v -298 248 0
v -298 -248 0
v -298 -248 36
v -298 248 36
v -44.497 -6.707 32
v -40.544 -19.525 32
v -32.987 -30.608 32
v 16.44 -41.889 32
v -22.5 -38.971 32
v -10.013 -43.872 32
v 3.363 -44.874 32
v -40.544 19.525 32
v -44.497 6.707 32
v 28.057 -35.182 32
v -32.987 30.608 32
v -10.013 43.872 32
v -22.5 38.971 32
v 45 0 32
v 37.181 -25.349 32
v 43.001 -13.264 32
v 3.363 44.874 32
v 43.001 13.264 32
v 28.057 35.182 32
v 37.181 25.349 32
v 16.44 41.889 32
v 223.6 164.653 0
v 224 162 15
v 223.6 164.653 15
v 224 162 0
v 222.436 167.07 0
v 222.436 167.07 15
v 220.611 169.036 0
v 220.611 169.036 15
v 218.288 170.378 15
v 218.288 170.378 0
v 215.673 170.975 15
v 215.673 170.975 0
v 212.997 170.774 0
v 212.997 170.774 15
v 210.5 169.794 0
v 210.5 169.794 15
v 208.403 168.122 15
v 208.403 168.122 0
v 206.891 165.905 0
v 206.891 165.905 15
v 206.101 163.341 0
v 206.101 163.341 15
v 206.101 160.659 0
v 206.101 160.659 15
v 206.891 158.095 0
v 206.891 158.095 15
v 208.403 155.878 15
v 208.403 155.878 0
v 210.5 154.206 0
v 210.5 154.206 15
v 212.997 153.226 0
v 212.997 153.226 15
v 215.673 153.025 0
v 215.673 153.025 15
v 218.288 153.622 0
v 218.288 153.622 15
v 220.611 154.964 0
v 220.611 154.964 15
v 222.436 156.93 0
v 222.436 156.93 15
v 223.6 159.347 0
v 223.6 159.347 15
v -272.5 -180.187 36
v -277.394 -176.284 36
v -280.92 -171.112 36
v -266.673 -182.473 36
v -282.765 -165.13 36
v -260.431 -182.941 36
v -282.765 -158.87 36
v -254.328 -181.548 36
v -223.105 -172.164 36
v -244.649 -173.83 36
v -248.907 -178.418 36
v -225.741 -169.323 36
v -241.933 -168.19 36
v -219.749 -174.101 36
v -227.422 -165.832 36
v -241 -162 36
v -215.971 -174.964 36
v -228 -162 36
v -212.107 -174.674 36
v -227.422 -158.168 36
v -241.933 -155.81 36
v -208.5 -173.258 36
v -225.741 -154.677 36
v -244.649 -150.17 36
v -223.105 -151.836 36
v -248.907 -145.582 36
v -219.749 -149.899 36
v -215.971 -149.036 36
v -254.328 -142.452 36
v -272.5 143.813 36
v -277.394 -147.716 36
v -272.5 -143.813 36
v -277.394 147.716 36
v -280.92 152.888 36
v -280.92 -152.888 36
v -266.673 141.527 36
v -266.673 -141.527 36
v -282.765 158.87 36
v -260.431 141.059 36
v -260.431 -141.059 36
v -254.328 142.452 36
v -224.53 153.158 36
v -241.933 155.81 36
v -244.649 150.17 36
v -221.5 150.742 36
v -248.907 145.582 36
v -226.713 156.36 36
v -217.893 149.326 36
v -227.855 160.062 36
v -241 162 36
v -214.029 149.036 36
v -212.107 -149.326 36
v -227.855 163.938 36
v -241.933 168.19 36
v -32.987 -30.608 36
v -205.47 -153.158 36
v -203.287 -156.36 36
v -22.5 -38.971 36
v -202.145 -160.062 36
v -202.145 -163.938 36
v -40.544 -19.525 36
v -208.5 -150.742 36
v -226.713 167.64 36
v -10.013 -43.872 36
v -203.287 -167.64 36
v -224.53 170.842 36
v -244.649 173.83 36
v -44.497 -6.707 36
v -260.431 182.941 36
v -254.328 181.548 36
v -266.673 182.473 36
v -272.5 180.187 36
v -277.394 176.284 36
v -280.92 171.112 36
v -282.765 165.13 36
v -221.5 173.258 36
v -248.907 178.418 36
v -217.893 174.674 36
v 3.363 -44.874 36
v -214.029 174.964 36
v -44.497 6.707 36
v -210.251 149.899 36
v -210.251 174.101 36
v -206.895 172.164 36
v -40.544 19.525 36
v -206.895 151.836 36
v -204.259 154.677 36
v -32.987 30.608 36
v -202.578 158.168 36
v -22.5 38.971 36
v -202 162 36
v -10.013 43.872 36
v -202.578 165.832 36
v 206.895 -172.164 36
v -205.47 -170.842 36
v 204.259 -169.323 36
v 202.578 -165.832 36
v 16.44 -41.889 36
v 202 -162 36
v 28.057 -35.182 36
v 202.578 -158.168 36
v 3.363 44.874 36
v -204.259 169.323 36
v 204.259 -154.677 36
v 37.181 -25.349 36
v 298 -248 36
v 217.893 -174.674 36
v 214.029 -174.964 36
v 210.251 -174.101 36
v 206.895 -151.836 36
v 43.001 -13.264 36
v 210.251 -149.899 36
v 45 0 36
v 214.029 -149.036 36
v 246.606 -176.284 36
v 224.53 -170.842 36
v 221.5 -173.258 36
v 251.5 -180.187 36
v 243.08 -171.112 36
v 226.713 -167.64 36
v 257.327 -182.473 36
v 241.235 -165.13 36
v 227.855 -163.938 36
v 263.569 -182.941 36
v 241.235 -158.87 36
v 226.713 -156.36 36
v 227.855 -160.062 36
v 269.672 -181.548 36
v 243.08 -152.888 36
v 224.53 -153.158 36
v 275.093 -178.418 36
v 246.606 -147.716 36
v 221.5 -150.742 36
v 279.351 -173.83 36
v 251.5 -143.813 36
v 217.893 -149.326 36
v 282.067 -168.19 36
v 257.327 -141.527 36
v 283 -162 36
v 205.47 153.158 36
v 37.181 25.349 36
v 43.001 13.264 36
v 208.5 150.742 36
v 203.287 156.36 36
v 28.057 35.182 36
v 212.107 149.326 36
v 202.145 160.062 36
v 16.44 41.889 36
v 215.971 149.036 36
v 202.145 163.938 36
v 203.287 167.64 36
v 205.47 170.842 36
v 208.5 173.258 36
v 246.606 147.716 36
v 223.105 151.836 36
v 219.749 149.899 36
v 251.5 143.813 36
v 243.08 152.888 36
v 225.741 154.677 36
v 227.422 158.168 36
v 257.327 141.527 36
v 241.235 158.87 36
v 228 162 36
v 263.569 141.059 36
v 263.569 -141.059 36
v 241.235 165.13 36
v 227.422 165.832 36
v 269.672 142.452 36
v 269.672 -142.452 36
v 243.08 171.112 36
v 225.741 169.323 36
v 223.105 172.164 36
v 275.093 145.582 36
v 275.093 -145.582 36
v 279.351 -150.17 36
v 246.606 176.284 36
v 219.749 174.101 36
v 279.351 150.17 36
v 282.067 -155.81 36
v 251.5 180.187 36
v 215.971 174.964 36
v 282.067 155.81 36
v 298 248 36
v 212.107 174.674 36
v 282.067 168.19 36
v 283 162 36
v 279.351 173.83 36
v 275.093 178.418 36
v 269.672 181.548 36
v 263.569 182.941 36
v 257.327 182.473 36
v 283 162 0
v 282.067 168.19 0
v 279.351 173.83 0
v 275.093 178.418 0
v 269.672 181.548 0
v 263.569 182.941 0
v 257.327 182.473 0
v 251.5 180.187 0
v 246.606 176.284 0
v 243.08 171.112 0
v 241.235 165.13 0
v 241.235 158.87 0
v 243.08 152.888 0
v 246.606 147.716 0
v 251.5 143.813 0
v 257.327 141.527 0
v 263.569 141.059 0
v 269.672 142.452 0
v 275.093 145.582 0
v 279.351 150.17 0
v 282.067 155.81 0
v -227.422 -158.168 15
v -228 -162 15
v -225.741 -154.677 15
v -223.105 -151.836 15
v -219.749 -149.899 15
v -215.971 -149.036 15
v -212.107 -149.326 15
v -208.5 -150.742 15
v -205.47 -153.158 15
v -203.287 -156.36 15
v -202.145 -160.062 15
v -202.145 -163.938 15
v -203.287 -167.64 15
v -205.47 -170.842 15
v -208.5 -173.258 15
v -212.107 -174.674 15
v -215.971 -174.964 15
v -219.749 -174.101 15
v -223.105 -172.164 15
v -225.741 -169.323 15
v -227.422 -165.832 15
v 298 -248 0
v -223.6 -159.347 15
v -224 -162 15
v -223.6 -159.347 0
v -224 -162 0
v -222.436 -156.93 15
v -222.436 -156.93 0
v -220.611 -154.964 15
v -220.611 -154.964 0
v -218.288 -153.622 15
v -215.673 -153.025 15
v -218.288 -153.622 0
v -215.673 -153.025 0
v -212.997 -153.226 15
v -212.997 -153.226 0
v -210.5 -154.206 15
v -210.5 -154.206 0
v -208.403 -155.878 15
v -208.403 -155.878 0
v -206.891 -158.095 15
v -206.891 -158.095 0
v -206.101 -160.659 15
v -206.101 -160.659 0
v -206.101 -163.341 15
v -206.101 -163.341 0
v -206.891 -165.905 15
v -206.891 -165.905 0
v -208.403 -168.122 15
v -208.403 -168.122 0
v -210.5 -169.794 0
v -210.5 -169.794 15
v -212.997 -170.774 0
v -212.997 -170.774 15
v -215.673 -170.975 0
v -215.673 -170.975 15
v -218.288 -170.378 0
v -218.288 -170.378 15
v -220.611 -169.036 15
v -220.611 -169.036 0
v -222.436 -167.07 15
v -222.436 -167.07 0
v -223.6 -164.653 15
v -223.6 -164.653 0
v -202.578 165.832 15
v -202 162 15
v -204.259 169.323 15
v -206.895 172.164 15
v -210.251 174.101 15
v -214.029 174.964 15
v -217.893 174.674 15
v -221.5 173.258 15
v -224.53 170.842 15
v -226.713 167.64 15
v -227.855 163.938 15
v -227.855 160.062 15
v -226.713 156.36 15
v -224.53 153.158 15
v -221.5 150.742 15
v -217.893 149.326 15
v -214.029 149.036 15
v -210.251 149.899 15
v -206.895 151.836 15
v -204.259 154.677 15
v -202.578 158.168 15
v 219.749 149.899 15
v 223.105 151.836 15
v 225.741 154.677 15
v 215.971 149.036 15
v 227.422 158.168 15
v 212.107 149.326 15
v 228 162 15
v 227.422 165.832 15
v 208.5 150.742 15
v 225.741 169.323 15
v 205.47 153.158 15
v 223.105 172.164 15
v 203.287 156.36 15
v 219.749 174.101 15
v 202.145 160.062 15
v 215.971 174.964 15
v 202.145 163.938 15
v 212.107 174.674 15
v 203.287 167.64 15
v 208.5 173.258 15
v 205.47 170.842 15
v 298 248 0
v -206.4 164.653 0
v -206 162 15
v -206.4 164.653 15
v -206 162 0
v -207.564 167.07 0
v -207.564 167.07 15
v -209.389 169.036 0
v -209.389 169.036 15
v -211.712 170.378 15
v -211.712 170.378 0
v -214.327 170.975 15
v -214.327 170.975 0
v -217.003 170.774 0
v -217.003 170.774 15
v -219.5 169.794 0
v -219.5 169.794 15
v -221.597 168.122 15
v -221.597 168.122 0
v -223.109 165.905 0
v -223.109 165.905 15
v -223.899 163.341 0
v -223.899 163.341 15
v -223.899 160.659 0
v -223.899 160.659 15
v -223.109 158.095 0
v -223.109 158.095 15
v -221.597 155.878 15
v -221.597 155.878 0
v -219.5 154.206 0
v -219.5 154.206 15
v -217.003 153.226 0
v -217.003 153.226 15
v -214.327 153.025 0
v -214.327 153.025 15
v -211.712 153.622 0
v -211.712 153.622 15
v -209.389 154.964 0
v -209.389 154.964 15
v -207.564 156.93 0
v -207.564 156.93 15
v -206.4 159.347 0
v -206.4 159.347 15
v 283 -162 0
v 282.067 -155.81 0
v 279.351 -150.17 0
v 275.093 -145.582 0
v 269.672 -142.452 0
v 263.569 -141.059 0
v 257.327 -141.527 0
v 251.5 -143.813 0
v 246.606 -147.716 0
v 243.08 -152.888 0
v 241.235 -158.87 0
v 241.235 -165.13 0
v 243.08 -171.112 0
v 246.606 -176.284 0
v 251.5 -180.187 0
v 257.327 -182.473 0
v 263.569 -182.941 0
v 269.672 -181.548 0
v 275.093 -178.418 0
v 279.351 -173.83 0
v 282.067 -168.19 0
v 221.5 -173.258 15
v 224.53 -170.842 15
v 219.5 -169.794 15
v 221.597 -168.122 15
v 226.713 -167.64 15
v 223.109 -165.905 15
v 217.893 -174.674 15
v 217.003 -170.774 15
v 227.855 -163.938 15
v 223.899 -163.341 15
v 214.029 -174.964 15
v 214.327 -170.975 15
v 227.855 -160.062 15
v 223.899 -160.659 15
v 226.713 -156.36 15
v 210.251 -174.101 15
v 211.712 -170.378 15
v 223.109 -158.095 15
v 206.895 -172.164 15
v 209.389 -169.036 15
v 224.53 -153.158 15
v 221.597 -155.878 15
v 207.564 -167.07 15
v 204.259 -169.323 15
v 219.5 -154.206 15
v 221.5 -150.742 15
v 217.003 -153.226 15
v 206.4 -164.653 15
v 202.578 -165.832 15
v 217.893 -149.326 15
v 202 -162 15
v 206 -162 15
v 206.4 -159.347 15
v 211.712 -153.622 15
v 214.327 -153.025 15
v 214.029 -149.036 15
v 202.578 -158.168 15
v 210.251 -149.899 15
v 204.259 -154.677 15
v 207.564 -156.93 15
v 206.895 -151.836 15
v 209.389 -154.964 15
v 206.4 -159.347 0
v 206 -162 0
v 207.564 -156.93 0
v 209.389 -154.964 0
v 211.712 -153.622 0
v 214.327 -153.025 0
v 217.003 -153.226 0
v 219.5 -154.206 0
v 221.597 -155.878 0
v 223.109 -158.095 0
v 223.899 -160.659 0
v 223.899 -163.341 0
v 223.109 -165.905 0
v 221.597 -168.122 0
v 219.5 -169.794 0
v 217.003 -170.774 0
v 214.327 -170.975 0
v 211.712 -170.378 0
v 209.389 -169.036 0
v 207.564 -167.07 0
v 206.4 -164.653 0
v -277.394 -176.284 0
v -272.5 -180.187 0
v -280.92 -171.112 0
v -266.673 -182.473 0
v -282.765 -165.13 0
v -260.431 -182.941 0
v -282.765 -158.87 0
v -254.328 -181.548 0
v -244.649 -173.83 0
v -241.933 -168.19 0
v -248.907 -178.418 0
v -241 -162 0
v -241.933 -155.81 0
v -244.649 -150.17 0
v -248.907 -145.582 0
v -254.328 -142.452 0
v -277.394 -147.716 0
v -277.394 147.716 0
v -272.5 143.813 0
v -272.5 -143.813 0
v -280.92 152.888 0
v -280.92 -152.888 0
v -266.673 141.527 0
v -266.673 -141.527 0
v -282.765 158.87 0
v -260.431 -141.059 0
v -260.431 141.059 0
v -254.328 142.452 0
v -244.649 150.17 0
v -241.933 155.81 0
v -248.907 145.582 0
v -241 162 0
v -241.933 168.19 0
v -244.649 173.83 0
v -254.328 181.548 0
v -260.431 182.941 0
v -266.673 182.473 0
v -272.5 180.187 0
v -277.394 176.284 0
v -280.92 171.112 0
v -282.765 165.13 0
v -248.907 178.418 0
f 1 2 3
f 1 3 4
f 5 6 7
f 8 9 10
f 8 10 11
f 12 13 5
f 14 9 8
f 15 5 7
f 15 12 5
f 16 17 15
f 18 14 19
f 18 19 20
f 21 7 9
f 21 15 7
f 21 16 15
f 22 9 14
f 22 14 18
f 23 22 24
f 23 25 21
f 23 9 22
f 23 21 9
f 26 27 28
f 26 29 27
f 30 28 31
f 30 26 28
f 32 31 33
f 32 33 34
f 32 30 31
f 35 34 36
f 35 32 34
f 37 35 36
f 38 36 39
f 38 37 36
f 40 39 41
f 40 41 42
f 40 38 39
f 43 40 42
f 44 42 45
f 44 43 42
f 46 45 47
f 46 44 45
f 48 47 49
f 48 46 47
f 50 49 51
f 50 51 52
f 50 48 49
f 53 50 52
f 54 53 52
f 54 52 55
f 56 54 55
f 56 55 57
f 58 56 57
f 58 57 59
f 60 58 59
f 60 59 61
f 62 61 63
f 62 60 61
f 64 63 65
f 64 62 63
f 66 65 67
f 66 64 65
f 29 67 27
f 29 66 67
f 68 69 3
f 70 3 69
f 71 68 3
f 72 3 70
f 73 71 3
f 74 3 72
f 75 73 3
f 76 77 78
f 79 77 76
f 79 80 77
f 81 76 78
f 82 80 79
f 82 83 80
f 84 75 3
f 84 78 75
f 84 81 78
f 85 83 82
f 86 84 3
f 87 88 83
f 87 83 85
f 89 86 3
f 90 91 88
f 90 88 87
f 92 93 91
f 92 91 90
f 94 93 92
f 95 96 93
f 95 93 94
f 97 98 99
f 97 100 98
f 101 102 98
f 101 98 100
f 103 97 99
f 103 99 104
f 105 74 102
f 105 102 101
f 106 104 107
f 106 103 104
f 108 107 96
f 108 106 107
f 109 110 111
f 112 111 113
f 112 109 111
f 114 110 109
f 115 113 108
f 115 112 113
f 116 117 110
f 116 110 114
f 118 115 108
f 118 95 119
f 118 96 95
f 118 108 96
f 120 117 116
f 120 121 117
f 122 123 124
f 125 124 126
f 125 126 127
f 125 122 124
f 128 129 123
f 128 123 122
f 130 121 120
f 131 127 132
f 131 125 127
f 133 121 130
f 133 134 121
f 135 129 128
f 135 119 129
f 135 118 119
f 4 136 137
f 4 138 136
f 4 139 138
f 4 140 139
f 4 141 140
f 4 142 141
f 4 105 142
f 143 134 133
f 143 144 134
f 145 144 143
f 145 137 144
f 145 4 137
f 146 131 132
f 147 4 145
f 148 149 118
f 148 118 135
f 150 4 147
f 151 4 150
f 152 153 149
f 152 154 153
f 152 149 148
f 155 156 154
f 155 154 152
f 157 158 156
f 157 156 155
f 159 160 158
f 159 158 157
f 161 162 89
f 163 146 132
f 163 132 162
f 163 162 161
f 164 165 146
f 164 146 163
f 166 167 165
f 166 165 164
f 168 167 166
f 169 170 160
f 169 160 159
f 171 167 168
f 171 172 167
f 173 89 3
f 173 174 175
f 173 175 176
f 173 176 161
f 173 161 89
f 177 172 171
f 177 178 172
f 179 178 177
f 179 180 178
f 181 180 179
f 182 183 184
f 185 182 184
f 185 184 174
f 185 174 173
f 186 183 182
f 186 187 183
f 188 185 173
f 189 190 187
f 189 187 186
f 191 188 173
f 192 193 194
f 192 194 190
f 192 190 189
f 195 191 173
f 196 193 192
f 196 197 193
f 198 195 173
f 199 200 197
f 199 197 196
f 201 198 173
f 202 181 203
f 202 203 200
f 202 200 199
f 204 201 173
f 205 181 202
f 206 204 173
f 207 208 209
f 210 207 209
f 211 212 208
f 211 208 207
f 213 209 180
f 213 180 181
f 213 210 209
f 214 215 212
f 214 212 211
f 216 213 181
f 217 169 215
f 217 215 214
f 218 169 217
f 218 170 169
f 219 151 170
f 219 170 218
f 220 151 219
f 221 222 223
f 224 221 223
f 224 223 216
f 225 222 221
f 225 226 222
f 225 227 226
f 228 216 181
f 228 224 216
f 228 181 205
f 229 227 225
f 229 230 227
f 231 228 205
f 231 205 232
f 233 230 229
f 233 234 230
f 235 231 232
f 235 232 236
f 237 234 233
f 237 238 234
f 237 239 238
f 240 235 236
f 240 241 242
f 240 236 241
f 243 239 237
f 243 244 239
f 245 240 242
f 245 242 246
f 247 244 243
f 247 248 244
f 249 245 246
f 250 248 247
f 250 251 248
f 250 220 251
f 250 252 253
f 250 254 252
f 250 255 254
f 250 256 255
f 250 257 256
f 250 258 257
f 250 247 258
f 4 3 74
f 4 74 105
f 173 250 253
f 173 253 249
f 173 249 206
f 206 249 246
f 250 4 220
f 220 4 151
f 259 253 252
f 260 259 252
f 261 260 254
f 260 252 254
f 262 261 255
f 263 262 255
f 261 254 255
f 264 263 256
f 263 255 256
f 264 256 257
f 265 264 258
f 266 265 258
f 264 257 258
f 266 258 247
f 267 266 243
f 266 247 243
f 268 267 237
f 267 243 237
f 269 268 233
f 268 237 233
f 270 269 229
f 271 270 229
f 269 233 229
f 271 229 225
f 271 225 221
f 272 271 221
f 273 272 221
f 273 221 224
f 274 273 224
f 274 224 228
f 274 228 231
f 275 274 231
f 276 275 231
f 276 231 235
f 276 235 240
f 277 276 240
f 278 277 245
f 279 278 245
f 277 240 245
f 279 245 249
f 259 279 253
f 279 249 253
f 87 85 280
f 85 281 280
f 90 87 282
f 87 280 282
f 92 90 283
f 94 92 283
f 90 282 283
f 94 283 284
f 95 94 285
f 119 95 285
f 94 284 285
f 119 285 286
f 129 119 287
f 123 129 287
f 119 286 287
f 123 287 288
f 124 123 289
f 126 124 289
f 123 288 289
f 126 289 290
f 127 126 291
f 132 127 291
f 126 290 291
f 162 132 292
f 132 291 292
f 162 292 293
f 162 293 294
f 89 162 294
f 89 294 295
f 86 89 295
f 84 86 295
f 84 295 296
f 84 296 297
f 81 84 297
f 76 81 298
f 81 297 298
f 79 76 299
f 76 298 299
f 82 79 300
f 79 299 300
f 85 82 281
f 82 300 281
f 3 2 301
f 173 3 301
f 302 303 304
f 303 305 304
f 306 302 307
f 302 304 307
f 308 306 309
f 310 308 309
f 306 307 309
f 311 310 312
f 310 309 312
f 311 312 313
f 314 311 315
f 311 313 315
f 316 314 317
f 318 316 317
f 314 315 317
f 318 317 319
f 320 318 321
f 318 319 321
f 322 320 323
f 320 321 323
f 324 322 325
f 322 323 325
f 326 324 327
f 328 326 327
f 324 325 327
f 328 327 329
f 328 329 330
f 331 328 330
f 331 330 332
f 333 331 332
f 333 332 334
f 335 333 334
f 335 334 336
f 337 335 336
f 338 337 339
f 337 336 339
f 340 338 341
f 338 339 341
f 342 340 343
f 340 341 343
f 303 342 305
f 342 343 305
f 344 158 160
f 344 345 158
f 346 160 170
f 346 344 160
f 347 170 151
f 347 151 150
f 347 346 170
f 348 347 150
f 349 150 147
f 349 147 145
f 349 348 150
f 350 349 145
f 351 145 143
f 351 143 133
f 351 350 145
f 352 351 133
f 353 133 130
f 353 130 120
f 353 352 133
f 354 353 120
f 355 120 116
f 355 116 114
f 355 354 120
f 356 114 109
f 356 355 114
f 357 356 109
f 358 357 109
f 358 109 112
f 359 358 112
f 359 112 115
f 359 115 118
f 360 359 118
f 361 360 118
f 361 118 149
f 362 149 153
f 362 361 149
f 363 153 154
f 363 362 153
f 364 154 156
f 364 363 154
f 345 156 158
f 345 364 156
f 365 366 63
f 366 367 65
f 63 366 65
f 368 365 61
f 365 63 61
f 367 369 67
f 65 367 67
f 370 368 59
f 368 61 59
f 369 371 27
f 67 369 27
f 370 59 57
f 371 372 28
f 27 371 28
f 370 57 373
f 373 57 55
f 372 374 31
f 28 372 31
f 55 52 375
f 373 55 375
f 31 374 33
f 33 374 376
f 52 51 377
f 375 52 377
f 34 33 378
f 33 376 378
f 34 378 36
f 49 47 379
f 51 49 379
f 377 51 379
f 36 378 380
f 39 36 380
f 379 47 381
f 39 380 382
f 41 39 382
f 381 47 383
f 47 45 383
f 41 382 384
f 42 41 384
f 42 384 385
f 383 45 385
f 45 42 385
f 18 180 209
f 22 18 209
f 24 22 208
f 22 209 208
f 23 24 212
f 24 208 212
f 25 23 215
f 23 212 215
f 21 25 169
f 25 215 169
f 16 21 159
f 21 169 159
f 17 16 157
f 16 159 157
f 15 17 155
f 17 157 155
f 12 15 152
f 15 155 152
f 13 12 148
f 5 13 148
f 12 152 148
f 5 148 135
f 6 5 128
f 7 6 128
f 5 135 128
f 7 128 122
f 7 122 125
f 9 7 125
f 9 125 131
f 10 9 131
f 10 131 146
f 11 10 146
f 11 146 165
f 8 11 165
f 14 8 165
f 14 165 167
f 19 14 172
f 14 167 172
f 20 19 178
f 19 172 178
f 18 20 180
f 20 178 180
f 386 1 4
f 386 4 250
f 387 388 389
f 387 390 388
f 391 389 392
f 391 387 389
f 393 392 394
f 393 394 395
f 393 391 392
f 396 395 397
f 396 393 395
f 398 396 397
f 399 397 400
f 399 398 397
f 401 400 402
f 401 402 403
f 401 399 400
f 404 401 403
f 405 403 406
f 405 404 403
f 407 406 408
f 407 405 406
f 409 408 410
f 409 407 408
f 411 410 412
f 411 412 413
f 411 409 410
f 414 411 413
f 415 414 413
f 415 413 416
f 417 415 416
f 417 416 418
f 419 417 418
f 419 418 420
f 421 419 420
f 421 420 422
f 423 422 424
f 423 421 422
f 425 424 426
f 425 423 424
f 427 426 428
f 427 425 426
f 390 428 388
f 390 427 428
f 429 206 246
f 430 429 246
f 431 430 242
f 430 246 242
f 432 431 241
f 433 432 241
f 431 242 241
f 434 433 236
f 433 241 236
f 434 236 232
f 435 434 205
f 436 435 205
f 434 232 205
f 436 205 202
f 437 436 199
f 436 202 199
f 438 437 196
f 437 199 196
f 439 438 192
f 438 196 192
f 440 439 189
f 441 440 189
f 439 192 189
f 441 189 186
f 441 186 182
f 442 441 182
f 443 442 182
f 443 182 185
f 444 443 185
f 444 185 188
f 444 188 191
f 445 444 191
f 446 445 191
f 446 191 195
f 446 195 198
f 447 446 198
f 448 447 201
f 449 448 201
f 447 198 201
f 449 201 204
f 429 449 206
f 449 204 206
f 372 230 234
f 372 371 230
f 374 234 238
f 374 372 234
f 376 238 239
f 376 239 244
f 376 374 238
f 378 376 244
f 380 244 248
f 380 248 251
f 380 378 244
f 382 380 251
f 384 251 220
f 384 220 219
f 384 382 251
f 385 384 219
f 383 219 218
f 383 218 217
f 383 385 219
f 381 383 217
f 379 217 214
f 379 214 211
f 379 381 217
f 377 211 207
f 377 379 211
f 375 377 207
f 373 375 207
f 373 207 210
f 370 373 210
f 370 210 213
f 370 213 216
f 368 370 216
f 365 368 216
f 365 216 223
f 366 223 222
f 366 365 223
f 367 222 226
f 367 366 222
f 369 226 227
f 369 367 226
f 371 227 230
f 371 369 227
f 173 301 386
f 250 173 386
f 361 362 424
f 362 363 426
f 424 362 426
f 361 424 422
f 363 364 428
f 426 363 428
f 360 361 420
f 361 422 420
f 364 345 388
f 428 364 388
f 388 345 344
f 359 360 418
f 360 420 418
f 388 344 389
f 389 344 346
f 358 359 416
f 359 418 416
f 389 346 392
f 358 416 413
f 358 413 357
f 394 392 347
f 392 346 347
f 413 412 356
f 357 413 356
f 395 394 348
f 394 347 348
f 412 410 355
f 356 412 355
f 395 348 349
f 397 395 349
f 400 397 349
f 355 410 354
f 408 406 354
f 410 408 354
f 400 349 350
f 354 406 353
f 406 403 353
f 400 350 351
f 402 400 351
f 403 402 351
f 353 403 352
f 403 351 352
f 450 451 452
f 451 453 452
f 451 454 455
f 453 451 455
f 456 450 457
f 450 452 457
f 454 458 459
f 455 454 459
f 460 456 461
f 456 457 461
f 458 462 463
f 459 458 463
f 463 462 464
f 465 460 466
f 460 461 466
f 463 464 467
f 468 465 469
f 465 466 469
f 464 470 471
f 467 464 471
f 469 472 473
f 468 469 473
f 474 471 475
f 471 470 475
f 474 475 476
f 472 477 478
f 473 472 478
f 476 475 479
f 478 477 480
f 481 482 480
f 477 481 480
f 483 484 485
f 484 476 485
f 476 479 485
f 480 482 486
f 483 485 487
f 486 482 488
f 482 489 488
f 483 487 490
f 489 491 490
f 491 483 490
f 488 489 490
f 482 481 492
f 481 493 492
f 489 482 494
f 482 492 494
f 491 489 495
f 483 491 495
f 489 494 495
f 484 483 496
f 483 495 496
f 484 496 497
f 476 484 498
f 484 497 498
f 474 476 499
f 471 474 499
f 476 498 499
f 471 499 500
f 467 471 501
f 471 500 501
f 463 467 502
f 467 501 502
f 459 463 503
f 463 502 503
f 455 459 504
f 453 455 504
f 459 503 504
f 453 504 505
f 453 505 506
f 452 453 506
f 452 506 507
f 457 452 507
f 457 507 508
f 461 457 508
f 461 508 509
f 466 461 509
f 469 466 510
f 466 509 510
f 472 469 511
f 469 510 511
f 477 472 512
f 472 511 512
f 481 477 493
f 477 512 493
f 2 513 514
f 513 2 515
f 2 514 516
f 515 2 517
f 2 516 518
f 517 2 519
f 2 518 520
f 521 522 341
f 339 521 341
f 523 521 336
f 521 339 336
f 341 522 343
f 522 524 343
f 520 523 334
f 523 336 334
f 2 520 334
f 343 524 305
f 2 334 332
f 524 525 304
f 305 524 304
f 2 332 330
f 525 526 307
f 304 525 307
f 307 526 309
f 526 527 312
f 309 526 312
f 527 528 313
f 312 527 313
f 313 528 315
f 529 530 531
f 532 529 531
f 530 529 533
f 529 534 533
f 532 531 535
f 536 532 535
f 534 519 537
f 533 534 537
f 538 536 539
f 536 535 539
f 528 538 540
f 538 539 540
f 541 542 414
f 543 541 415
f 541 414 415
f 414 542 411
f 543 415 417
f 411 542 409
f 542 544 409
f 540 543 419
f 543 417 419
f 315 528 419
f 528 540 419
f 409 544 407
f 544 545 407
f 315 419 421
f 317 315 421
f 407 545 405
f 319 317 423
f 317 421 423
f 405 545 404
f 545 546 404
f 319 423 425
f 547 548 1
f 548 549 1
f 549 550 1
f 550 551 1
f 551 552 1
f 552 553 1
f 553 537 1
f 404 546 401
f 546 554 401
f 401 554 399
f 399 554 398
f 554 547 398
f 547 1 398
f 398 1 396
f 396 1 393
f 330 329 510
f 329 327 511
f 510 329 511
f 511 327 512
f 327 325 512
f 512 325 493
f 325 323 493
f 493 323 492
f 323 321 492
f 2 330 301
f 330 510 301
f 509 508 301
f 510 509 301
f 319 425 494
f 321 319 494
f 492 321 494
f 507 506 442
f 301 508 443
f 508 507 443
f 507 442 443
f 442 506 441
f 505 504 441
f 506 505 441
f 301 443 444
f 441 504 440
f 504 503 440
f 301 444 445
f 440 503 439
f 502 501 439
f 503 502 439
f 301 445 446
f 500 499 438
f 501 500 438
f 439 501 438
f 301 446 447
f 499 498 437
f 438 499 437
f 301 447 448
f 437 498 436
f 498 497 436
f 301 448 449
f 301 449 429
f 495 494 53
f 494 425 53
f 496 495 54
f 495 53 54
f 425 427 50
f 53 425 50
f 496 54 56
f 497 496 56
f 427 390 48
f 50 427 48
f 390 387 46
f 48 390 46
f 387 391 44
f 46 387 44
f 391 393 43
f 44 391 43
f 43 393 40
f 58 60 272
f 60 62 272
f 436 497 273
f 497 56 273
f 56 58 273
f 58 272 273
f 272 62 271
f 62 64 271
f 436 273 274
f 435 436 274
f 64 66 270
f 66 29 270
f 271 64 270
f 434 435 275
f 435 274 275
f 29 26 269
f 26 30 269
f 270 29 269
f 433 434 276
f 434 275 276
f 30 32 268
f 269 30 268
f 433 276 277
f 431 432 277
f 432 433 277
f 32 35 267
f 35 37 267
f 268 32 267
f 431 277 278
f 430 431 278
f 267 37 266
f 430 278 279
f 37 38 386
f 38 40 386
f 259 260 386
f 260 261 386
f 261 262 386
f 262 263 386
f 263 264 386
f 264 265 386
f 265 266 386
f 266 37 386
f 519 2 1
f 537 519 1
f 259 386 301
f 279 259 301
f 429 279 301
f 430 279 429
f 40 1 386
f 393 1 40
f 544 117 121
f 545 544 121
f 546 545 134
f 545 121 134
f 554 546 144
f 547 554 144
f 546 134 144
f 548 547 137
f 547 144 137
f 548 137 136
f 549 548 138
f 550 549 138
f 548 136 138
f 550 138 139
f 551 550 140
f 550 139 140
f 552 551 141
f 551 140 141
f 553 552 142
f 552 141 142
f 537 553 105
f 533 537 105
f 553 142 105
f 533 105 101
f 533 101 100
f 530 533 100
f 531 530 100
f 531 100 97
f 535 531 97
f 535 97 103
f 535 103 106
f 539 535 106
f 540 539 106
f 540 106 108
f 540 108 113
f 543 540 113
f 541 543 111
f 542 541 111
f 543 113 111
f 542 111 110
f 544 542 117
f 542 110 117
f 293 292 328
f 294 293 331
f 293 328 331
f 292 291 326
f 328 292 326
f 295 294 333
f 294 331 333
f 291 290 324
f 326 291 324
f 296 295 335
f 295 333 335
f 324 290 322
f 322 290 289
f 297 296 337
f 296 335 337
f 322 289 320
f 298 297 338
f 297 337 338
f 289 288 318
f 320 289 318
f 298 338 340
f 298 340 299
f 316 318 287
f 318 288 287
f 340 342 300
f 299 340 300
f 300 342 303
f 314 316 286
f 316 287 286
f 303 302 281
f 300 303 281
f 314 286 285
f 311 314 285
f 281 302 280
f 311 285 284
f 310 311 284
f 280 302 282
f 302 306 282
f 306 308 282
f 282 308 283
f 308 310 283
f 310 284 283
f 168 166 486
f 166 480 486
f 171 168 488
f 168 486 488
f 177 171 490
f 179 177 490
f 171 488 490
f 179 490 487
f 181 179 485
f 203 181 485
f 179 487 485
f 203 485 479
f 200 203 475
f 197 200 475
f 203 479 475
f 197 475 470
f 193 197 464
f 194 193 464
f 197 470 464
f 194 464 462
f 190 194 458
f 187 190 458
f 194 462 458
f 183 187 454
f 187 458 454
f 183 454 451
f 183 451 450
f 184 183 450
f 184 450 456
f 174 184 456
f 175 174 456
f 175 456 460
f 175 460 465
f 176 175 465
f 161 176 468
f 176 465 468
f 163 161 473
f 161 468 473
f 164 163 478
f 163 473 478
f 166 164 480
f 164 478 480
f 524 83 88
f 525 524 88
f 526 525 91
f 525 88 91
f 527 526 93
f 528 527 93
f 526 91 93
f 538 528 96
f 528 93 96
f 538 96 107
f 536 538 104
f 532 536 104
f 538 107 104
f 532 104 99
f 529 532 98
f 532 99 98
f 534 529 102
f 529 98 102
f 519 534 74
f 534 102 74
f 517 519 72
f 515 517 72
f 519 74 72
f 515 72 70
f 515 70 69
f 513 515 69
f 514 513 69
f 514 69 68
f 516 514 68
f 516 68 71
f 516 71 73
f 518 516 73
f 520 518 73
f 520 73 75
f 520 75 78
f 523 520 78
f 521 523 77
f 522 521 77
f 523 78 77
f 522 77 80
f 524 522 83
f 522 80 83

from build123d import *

# Parameters (mm, degrees)
SZKIC1_W                    = 596
SZKIC1_H                    = 496
DODANIE_WYCI_GNI_CIE1_DEPTH = 36
SZKIC2_R                    = 45
WYTNIJ_WYCI_GNI_CIE1_DEPTH  = 4
SZKIC3_R                    = 21
WYTNIJ_WYCI_GNI_CIE2_DEPTH  = 36
SZKIC4_R                    = 21
WYTNIJ_WYCI_GNI_CIE3_DEPTH  = 36
SZKIC5_R                    = 21
WYTNIJ_WYCI_GNI_CIE4_DEPTH  = 36
SZKIC6_R                    = 21
WYTNIJ_WYCI_GNI_CIE5_DEPTH  = 36
SZKIC7_W                    = 15
SZKIC7_H                    = 9
SZKIC8_W                    = 15
SZKIC8_H                    = 9
SZKIC9_W                    = 15
SZKIC9_H                    = 9
SZKIC10_W                   = 15
SZKIC10_H                   = 9
SZKIC11_W                   = 21
SZKIC11_H                   = 13
SZKIC12_W                   = 21
SZKIC12_H                   = 13
SZKIC13_W                   = 21
SZKIC13_H                   = 13
SZKIC14_W                   = 21
SZKIC14_H                   = 13


with BuildPart() as part:
    # Szkic1 → Dodanie-wyciągnięcie1 (new body)
    with BuildSketch(Plane.XY):
        Rectangle(SZKIC1_W, SZKIC1_H)
    extrude(amount=DODANIE_WYCI_GNI_CIE1_DEPTH)

    # Szkic2 → Wytnij-wyciągnięcie1 (cut)
    with BuildSketch(Plane.XY.offset(36)):
        Circle(SZKIC2_R)
    extrude(amount=-WYTNIJ_WYCI_GNI_CIE1_DEPTH, mode=Mode.SUBTRACT)

    # Szkic3 → Wytnij-wyciągnięcie2 (cut)
    with BuildSketch(Plane.XY.offset(36)):
        with Locations((262, 162)):
            Circle(SZKIC3_R)
    extrude(amount=-WYTNIJ_WYCI_GNI_CIE2_DEPTH, mode=Mode.SUBTRACT)

    # Szkic4 → Wytnij-wyciągnięcie3 (cut)
    with BuildSketch(Plane.XY.offset(36)):
        with Locations((262, -162)):
            Circle(SZKIC4_R)
    extrude(amount=-WYTNIJ_WYCI_GNI_CIE3_DEPTH, mode=Mode.SUBTRACT)

    # Szkic5 → Wytnij-wyciągnięcie4 (cut)
    with BuildSketch(Plane.XY.offset(36)):
        with Locations((-262, -162)):
            Circle(SZKIC5_R)
    extrude(amount=-WYTNIJ_WYCI_GNI_CIE4_DEPTH, mode=Mode.SUBTRACT)

    # Szkic6 → Wytnij-wyciągnięcie5 (cut)
    with BuildSketch(Plane.XY.offset(36)):
        with Locations((-262, 162)):
            Circle(SZKIC6_R)
    extrude(amount=-WYTNIJ_WYCI_GNI_CIE5_DEPTH, mode=Mode.SUBTRACT)

    # Szkic7 → Wycięcie-obrót1 (revolve, cut)
    with BuildSketch(Plane(origin=(215, 0, 0), x_dir=(0, 0, -1), z_dir=(1, 0, 0))):
        with Locations((-7.5, 166.5)):
            Rectangle(SZKIC7_W, SZKIC7_H)
    revolve(axis=Axis((215, 162, 0), (0, 0, 1)), mode=Mode.SUBTRACT)

    # Szkic8 → Wycięcie-obrót2 (revolve, cut)
    with BuildSketch(Plane(origin=(215, 0, 0), x_dir=(0, 0, -1), z_dir=(1, 0, 0))):
        with Locations((-7.5, -166.5)):
            Rectangle(SZKIC8_W, SZKIC8_H)
    revolve(axis=Axis((215, -162, 15), (0, 0, -1)), mode=Mode.SUBTRACT)

    # Szkic9 → Wycięcie-obrót3 (revolve, cut)
    with BuildSketch(Plane(origin=(-215, 0, 0), x_dir=(0, 0, -1), z_dir=(1, 0, 0))):
        with Locations((-7.5, 166.5)):
            Rectangle(SZKIC9_W, SZKIC9_H)
    revolve(axis=Axis((-215, 162, 0), (0, 0, 1)), mode=Mode.SUBTRACT)

    # Szkic10 → Wycięcie-obrót4 (revolve, cut)
    with BuildSketch(Plane(origin=(-215, 0, 0), x_dir=(0, 0, -1), z_dir=(1, 0, 0))):
        with Locations((-7.5, -166.5)):
            Rectangle(SZKIC10_W, SZKIC10_H)
    revolve(axis=Axis((-215, -162, 15), (0, 0, -1)), mode=Mode.SUBTRACT)

    # Szkic11 → Wycięcie-obrót5 (revolve, cut)
    with BuildSketch(Plane(origin=(215, 0, 0), x_dir=(0, 0, -1), z_dir=(1, 0, 0))):
        with Locations((-25.5, 168.5)):
            Rectangle(SZKIC11_W, SZKIC11_H)
    revolve(axis=Axis((215, 162, 15), (0, 0, 1)), mode=Mode.SUBTRACT)

    # Szkic12 → Wycięcie-obrót6 (revolve, cut)
    with BuildSketch(Plane(origin=(215, 0, 0), x_dir=(0, 0, -1), z_dir=(1, 0, 0))):
        with Locations((-25.5, -168.5)):
            Rectangle(SZKIC12_W, SZKIC12_H)
    revolve(axis=Axis((215, -162, 36), (0, 0, -1)), mode=Mode.SUBTRACT)

    # Szkic13 → Wycięcie-obrót7 (revolve, cut)
    with BuildSketch(Plane(origin=(-215, 0, 0), x_dir=(0, 0, -1), z_dir=(1, 0, 0))):
        with Locations((-25.5, -168.5)):
            Rectangle(SZKIC13_W, SZKIC13_H)
    revolve(axis=Axis((-215, -162, 36), (0, 0, -1)), mode=Mode.SUBTRACT)

    # Szkic14 → Wycięcie-obrót8 (revolve, cut)
    with BuildSketch(Plane(origin=(-215, 0, 0), x_dir=(0, 0, -1), z_dir=(1, 0, 0))):
        with Locations((-25.5, 168.5)):
            Rectangle(SZKIC14_W, SZKIC14_H)
    revolve(axis=Axis((-215, 162, 15), (0, 0, 1)), mode=Mode.SUBTRACT)


solid = part.part
